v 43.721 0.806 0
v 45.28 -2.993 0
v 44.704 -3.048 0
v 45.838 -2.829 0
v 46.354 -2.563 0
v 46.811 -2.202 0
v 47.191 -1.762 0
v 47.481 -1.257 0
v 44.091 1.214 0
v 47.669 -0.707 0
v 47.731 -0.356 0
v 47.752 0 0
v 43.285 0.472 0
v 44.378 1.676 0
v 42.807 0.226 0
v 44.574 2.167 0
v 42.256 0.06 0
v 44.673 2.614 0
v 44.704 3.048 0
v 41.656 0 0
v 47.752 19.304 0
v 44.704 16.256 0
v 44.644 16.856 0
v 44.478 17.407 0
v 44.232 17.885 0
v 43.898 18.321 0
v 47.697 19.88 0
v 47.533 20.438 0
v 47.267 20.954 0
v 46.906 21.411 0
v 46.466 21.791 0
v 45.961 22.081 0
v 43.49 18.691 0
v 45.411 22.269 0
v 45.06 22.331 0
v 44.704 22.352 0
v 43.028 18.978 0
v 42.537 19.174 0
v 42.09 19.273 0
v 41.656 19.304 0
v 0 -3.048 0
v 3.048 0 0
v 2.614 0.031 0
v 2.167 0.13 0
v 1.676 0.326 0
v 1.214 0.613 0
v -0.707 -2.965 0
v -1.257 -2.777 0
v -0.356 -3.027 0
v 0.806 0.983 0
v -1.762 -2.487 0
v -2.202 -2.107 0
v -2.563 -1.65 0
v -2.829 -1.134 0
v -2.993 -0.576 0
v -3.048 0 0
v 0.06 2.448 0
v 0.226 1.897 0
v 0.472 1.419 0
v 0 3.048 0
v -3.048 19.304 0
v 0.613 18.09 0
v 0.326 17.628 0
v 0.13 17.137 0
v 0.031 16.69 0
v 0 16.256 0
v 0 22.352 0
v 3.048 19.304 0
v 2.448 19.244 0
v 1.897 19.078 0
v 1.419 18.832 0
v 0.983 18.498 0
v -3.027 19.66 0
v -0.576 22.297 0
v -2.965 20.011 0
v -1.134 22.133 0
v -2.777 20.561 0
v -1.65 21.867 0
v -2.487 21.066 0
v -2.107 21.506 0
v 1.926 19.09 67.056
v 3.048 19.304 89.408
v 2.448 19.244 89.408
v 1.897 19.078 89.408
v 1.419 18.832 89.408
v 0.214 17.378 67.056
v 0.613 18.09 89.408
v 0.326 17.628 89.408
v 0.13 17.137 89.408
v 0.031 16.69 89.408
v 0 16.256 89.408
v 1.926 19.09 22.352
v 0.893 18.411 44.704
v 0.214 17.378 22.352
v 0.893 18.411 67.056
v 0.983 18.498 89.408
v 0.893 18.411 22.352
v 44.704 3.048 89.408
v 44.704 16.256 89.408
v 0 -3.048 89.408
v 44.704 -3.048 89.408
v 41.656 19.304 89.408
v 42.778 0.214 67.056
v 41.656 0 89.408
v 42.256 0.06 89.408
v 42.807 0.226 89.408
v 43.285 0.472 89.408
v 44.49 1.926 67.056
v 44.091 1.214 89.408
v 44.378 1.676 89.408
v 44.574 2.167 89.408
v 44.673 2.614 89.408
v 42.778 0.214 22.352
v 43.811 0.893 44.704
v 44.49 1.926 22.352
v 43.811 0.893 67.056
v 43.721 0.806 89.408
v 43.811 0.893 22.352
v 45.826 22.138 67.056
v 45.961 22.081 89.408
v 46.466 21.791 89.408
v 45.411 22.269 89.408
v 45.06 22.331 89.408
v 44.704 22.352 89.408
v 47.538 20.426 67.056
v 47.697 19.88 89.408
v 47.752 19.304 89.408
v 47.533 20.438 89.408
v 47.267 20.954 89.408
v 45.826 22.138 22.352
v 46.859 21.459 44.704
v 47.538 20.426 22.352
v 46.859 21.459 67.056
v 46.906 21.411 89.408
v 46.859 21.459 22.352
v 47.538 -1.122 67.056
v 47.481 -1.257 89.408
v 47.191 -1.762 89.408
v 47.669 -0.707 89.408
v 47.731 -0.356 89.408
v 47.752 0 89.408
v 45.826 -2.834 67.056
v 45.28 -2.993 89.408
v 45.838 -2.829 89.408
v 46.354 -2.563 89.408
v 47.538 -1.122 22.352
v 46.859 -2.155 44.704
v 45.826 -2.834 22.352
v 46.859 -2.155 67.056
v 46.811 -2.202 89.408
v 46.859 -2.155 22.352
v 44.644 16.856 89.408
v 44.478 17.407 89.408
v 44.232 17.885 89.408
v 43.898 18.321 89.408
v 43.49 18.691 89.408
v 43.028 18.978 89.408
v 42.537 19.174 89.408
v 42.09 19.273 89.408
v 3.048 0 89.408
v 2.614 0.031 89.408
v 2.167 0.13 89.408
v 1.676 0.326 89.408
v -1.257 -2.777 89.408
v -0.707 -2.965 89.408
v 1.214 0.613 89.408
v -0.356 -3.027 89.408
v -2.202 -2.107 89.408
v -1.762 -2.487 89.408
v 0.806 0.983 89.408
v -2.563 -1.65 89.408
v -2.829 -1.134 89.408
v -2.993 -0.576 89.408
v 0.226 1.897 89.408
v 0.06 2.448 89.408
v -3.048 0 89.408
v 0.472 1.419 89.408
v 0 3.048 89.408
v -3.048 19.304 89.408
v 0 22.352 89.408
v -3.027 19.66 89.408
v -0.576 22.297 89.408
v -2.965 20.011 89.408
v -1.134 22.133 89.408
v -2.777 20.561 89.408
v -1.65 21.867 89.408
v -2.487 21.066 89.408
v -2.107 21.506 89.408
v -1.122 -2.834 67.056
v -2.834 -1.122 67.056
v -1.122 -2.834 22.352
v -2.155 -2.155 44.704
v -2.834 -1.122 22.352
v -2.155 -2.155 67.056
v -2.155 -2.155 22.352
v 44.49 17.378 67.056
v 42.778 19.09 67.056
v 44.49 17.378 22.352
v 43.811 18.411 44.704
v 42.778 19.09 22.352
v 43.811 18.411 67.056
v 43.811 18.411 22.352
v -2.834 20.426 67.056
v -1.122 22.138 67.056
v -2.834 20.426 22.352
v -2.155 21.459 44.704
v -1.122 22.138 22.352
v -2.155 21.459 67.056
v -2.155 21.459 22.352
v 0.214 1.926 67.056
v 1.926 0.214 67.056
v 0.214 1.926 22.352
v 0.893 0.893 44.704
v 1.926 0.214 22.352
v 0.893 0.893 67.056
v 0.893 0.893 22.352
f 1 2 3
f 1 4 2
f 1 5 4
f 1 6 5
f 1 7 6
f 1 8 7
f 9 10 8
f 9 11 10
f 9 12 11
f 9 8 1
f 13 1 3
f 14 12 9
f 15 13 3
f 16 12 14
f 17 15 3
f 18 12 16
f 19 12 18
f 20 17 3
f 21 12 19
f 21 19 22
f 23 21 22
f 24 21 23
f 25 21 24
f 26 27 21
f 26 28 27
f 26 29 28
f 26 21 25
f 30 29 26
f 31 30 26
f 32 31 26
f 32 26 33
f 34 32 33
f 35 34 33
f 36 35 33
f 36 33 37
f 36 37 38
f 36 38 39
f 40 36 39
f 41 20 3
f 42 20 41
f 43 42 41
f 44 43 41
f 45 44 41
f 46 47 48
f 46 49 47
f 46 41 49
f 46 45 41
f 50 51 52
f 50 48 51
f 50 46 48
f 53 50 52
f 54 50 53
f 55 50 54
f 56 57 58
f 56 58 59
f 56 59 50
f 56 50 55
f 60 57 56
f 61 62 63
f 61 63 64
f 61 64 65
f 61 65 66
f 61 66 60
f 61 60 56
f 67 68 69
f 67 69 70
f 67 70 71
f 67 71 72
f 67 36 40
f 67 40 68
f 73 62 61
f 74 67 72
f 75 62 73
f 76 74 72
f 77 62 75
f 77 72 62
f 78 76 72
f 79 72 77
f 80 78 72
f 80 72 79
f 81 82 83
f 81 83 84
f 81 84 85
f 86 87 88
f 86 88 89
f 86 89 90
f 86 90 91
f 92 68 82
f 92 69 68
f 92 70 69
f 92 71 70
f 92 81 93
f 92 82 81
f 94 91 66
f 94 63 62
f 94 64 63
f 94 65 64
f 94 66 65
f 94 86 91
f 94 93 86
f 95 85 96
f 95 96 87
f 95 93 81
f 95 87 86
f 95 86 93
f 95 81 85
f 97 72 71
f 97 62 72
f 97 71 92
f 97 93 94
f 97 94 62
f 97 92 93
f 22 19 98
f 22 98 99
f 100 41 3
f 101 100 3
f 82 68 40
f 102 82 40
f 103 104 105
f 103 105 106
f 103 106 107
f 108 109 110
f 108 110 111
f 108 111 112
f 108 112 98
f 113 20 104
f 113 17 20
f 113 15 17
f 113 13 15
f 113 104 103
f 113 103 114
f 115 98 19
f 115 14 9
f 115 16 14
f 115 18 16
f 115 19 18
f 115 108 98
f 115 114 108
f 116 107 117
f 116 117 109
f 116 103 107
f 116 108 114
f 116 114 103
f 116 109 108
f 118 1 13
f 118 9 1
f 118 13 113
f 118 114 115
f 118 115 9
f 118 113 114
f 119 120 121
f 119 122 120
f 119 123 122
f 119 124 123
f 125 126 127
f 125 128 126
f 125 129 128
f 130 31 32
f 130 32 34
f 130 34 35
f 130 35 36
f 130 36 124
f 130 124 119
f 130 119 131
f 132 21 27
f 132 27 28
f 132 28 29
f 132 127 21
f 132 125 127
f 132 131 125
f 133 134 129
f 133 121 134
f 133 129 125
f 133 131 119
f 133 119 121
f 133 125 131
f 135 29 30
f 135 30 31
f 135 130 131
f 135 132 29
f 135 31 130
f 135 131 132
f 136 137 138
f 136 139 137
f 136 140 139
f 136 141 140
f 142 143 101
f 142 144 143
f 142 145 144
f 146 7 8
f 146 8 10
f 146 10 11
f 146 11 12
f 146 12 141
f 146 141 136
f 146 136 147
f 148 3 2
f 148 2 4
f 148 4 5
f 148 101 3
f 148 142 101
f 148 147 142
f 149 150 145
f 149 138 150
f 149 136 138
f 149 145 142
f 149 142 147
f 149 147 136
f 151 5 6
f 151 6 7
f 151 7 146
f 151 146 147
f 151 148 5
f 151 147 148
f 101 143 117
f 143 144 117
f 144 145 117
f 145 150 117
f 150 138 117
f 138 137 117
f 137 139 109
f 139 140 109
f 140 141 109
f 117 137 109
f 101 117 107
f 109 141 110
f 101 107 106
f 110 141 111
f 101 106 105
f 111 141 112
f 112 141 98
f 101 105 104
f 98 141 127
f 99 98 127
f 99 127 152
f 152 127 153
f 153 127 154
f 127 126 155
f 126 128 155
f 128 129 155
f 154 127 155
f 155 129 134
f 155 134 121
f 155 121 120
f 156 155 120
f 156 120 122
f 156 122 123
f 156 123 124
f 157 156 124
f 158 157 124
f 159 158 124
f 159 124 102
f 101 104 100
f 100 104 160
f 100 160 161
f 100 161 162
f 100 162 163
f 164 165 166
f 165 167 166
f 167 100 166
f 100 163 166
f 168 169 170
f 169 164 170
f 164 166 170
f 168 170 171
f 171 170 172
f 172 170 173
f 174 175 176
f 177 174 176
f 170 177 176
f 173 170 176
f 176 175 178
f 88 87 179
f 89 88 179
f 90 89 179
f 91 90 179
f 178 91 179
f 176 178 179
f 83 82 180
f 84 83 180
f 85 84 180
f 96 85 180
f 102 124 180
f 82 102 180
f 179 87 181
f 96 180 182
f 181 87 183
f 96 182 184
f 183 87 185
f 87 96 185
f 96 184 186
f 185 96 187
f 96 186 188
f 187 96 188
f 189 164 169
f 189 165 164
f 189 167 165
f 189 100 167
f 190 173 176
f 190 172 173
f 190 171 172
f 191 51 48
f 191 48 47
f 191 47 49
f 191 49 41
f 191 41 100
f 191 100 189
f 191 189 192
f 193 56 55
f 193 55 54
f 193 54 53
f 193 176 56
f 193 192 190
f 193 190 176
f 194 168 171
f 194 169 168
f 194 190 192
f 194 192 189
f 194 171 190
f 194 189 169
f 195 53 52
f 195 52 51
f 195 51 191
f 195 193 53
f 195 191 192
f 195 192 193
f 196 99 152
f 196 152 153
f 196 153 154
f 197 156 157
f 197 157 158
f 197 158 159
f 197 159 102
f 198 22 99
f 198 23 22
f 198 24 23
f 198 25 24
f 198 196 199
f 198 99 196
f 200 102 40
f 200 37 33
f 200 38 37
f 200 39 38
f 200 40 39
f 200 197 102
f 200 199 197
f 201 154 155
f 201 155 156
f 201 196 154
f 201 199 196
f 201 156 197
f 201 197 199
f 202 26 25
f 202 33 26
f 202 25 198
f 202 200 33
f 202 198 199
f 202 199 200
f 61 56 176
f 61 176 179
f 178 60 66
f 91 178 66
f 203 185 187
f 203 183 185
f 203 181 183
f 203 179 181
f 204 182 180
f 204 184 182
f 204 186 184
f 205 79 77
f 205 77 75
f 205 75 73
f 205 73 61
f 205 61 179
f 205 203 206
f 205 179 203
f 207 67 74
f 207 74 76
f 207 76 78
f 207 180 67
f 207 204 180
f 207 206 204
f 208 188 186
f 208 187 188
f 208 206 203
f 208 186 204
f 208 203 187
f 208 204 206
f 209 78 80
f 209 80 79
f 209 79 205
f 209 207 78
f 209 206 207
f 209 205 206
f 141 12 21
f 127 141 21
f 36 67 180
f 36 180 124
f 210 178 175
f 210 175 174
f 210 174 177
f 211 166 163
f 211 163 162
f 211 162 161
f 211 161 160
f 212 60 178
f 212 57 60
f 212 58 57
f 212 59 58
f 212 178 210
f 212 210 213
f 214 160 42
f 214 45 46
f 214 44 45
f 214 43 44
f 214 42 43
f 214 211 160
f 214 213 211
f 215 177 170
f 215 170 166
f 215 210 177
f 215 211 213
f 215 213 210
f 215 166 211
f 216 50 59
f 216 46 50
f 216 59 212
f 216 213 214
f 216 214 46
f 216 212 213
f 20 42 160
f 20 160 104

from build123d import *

# Parameters (mm, degrees)
SKETCH1_W           = 50.8
SKETCH1_H           = 25.4
SKETCH1_W_2         = 44.704
SKETCH1_H_2         = 19.304
BOSS_EXTRUDE1_DEPTH = 89.408
VARFILLET1_R        = 3.048


with BuildPart() as part:
    # Sketch1 → Boss-Extrude1 (new body)
    with BuildSketch(Plane.XY):
        with Locations((22.352, 9.652)):
            Rectangle(SKETCH1_W, SKETCH1_H)
        with Locations((22.352, 9.652)):
            Rectangle(SKETCH1_W_2, SKETCH1_H_2, mode=Mode.SUBTRACT)
    extrude(amount=BOSS_EXTRUDE1_DEPTH)

    # VarFillet1
    varfillet1_edges = [part.edges().sort_by_distance(p)[0] for p in [
        (0, 19.304, 44.704),
        (0, 0, 44.704),
        (44.704, 19.304, 44.704),
        (44.704, 0, 44.704),
        (47.752, -3.048, 44.704),
        (47.752, 22.352, 44.704),
        (-3.048, 22.352, 44.704),
        (-3.048, -3.048, 44.704),
    ]]
    fillet(varfillet1_edges, radius=VARFILLET1_R)


solid = part.part
